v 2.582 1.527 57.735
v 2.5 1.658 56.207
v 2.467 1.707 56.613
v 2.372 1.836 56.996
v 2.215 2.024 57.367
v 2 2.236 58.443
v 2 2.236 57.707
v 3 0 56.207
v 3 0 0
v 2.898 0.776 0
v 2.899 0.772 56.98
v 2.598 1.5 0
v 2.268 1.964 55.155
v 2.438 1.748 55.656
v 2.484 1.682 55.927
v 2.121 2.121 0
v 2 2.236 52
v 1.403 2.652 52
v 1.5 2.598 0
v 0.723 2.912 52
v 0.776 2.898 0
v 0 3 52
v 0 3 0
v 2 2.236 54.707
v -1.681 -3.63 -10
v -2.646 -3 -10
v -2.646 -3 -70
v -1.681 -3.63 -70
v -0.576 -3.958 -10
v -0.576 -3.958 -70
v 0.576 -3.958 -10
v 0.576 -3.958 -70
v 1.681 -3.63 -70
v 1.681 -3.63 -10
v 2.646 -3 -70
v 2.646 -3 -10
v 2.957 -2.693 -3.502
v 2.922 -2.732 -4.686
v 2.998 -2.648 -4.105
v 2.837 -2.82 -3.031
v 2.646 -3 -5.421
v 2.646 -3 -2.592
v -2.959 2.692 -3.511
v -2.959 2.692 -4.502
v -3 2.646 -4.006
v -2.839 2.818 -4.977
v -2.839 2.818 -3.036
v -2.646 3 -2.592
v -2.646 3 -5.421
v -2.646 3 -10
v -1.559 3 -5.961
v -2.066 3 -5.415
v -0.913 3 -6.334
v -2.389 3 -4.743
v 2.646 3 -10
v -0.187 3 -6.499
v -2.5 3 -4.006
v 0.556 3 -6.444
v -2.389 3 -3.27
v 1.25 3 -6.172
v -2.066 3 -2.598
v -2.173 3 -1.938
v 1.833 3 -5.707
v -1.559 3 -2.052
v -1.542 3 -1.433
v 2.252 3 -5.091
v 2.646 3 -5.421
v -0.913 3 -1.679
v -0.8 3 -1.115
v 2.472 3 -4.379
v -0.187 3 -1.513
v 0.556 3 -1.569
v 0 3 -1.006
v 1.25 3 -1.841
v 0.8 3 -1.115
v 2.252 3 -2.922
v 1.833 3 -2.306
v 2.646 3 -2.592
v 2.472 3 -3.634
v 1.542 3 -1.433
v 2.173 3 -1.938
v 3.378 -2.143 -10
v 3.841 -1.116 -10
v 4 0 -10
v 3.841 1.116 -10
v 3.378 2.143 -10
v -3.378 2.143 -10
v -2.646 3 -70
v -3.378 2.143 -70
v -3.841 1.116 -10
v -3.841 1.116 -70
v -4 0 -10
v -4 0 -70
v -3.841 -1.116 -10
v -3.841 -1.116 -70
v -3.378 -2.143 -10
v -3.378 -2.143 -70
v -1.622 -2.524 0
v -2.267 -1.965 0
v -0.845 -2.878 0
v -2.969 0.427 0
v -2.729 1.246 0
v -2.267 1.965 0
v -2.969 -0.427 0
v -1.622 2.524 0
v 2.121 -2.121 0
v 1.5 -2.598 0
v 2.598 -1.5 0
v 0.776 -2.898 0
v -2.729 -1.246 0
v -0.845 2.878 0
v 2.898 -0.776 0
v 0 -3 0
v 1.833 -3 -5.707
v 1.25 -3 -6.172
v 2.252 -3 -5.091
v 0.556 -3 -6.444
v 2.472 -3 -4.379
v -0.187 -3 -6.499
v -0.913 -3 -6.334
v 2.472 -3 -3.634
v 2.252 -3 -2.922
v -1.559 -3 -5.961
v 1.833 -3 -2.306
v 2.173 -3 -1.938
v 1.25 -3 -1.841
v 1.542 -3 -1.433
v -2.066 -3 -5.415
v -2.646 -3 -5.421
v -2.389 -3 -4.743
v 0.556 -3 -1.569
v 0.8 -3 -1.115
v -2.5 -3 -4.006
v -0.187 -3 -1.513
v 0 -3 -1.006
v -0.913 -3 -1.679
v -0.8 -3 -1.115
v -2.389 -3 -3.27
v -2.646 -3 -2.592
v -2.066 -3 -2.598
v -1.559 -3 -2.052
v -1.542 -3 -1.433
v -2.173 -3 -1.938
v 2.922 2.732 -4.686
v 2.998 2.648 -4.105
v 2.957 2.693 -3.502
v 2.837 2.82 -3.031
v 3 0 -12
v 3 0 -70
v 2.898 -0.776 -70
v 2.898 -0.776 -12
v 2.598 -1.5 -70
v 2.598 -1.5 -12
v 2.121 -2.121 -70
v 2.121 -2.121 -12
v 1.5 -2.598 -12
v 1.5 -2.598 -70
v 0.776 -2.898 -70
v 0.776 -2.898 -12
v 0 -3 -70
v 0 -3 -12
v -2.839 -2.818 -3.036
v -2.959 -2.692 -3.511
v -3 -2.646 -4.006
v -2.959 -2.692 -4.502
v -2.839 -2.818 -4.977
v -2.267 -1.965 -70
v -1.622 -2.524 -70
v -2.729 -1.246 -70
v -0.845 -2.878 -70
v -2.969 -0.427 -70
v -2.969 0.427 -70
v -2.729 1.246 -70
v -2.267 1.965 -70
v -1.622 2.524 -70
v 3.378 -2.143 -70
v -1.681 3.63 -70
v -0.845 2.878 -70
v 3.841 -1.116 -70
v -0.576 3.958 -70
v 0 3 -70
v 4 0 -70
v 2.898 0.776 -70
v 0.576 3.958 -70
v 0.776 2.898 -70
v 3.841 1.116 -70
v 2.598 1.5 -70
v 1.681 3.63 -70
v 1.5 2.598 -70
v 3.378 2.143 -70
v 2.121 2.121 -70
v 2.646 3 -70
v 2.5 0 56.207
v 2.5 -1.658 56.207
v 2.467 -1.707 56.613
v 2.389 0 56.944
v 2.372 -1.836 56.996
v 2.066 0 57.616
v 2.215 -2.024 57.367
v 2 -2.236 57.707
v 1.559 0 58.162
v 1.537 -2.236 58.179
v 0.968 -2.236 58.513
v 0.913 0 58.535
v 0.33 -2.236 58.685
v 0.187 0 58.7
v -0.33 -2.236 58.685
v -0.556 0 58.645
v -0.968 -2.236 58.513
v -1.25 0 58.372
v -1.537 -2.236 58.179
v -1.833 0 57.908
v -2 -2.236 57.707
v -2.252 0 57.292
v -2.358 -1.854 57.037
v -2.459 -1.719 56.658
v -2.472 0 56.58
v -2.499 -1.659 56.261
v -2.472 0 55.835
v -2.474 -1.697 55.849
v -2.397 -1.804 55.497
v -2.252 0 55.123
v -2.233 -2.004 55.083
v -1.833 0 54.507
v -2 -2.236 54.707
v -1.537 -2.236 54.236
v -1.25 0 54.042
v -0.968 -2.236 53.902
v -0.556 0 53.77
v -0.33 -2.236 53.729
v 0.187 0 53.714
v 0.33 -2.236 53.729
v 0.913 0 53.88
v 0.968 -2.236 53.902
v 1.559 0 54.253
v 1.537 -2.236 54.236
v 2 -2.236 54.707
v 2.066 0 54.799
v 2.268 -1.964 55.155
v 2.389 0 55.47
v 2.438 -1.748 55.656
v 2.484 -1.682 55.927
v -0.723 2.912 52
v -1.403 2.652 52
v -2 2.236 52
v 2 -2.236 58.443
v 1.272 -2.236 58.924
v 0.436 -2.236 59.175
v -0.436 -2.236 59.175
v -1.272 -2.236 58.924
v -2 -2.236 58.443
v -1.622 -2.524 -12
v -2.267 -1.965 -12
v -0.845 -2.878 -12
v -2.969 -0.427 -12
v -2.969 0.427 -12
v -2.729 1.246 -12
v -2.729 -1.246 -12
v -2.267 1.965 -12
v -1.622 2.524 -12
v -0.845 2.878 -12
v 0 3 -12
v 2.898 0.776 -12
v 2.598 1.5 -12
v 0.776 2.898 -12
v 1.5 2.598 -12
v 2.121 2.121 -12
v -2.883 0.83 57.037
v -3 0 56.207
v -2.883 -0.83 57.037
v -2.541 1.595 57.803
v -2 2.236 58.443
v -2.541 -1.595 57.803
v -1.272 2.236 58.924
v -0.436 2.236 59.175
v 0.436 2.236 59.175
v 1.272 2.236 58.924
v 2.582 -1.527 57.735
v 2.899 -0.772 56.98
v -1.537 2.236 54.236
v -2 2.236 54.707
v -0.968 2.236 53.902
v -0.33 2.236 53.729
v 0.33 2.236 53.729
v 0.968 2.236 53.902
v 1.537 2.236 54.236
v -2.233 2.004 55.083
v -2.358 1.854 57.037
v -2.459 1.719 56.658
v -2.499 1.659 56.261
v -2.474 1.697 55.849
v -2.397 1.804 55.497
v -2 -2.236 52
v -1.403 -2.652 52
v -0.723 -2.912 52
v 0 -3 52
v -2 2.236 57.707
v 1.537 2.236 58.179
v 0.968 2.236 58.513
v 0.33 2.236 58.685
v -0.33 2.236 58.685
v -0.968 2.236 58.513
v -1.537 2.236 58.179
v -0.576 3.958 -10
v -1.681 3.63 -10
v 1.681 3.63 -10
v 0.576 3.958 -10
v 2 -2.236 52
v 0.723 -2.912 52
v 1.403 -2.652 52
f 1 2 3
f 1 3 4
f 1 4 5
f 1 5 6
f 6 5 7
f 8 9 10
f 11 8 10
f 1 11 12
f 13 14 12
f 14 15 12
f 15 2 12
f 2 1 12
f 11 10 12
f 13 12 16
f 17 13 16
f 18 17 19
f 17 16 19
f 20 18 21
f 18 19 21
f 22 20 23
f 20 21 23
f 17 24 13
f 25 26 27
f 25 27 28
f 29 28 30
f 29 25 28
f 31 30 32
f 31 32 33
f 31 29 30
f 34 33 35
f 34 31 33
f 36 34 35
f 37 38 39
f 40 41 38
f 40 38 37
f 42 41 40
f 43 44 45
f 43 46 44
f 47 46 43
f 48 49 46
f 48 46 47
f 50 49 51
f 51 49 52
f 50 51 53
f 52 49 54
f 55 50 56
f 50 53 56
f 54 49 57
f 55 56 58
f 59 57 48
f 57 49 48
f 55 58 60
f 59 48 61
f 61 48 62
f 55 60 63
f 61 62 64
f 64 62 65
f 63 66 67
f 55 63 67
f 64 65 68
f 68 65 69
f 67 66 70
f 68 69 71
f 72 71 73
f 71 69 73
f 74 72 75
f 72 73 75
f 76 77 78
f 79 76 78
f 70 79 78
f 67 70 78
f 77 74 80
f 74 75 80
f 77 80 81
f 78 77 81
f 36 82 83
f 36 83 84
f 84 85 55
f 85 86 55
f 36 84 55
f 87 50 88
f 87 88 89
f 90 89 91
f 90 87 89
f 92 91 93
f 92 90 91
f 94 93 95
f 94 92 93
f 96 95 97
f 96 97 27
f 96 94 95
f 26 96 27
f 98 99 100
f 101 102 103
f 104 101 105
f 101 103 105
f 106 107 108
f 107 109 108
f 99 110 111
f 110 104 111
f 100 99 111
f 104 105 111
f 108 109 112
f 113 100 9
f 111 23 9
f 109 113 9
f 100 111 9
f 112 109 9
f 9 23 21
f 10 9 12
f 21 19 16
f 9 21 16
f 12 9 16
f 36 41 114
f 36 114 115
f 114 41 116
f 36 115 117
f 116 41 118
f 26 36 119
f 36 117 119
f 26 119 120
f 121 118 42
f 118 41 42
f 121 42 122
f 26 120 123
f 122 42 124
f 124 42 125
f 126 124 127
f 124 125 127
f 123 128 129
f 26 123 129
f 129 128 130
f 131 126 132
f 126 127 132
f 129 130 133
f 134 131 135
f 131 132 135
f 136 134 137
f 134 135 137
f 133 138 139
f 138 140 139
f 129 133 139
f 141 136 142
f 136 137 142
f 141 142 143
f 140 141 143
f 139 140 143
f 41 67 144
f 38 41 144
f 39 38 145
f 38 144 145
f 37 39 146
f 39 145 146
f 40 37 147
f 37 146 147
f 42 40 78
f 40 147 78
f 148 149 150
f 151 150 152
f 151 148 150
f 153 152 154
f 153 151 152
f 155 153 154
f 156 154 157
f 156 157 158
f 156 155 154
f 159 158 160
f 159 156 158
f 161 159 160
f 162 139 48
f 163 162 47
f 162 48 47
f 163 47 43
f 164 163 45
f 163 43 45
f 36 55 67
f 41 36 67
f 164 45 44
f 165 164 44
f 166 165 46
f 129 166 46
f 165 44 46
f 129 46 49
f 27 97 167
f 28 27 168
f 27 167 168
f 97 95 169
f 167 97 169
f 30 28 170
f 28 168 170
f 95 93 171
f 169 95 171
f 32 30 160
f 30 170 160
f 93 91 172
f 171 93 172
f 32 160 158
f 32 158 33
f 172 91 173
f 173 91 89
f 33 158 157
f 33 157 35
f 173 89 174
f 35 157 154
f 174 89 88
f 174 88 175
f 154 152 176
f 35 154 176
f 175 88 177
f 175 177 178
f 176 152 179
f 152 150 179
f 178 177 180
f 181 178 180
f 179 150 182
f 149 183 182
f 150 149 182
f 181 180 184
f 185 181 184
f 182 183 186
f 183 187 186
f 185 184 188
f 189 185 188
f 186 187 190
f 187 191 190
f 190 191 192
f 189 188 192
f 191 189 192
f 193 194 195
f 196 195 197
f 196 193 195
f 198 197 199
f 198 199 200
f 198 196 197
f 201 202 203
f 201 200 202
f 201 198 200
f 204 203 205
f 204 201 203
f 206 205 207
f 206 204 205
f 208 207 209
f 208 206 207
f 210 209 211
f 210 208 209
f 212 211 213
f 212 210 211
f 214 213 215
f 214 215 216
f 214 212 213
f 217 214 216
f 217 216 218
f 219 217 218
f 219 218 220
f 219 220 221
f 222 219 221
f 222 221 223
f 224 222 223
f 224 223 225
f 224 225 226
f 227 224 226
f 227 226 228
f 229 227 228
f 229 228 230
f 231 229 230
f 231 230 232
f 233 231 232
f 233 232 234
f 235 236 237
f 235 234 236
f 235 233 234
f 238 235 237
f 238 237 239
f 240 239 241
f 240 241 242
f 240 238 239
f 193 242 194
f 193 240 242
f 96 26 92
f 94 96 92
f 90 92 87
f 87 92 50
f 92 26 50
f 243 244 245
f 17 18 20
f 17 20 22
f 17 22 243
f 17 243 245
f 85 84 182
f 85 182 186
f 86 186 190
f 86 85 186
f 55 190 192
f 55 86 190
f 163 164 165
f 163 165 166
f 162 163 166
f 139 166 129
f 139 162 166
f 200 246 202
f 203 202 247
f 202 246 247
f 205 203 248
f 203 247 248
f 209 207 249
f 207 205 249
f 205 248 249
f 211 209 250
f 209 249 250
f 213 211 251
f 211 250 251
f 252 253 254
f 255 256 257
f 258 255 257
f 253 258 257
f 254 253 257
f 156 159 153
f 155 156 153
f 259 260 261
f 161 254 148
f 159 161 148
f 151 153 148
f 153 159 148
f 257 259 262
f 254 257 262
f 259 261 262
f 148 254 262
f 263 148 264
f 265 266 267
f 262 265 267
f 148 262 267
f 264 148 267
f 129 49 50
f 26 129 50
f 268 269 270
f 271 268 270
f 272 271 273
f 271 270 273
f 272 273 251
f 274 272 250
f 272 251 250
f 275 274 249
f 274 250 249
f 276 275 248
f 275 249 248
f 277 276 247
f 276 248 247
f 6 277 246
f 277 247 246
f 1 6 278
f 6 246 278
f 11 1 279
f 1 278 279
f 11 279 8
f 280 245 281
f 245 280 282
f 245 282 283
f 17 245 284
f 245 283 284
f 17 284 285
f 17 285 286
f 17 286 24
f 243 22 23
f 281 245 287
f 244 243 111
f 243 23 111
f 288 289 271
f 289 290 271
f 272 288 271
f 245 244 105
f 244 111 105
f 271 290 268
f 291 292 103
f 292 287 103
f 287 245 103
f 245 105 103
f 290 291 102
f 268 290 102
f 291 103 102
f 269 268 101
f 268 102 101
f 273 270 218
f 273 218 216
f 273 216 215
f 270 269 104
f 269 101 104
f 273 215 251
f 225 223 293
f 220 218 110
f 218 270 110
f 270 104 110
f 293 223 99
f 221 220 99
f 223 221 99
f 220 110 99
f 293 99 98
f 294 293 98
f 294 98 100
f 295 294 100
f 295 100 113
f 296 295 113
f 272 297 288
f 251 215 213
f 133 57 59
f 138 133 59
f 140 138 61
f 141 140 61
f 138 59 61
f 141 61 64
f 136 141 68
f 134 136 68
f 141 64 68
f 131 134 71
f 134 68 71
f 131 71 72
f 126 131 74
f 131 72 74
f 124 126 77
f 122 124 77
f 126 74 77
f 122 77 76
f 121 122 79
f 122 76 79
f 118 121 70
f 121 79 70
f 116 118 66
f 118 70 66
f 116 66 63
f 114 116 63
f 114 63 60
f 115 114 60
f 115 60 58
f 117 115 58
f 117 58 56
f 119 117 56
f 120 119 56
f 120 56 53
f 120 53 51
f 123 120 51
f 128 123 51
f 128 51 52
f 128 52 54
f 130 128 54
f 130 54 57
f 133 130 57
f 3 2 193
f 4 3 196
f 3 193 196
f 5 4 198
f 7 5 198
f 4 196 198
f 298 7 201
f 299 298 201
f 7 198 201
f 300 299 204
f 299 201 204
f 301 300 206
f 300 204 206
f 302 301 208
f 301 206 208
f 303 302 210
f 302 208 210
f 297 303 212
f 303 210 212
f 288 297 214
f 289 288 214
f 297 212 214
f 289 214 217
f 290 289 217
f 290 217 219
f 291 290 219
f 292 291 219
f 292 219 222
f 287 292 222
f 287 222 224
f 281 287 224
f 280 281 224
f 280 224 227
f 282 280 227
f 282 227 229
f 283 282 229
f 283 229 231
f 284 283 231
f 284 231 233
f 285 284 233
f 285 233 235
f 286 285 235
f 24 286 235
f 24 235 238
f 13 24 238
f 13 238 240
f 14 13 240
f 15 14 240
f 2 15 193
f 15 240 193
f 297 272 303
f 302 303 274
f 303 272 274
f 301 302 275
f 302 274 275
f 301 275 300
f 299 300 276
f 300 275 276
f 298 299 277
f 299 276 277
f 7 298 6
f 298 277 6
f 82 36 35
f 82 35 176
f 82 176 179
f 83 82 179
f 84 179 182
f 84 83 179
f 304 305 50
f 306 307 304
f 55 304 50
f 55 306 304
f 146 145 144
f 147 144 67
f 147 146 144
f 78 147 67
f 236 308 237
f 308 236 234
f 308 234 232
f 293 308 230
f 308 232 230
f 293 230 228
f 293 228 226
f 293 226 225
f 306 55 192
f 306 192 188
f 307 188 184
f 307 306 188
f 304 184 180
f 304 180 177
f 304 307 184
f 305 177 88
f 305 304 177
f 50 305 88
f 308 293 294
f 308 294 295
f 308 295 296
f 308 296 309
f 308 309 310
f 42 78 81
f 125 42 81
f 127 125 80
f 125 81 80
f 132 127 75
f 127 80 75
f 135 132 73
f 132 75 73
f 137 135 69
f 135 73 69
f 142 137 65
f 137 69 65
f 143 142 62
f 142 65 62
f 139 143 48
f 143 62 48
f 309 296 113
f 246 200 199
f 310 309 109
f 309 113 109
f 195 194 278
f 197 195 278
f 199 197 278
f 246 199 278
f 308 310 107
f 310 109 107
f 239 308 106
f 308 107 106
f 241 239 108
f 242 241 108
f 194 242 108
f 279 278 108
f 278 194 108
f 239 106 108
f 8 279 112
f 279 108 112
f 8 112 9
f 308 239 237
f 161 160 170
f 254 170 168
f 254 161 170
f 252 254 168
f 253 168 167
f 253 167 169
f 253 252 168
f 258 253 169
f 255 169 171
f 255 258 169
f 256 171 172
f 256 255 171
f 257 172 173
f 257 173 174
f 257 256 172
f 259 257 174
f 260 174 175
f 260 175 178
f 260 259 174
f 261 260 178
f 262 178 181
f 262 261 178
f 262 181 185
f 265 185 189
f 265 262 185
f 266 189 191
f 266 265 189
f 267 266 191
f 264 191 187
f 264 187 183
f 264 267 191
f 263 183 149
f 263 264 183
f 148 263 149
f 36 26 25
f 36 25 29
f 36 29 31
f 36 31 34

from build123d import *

# Parameters (mm, degrees)
F1_DEPTH  = 70
F2_DEPTH  = 60
F3_DEPTH  = 12
F4_DEPTH  = 10
F5_R      = 2.5
F6_DEPTH  = 25
F8_DEPTH  = 8
F9_R      = 2.5
F10_DEPTH = 12.5


with BuildPart() as f1:
    # F0 (on Top) → F1 (new body)
    with BuildSketch(Plane.XY):
        with BuildLine():
            ThreePointArc((2.6457513111, -3), (3.6457513111, -1.6457513111), (4, 0))
            ThreePointArc((4, 0), (3.6457513111, 1.6457513111), (2.6457513111, 3))
            Line((2.6457513111, 3), (0, 3))
            ThreePointArc((0, 3), (2.1213203436, 2.1213203436), (3, 0))
            ThreePointArc((3, 0), (2.1213203436, -2.1213203436), (0, -3))
            Line((0, -3), (2.6457513111, -3))
        make_face()
        with BuildLine():
            Line((0, 3), (2.6457513111, 3))
            ThreePointArc((2.6457513111, 3), (0, 4), (-2.6457513111, 3))
            Line((-2.6457513111, 3), (0, 3))
        make_face()
        with BuildLine():
            ThreePointArc((-2.6457513111, -3), (0, -4), (2.6457513111, -3))
            Line((2.6457513111, -3), (0, -3))
            Line((0, -3), (-2.6457513111, -3))
        make_face()
        with BuildLine():
            Line((0, 3), (-2.6457513111, 3))
            ThreePointArc((-2.6457513111, 3), (-4, 0), (-2.6457513111, -3))
            Line((-2.6457513111, -3), (0, -3))
            ThreePointArc((0, -3), (-3, 0), (0, 3))
        make_face()
    extrude(amount=-F1_DEPTH)



with BuildPart() as f2:
    # F0 (on Top) → F2 (new body)
    with BuildSketch(Plane.XY):
        with BuildLine():
            ThreePointArc((3, 0), (2.1213203436, 2.1213203436), (0, 3))
            ThreePointArc((0, 3), (-3, 0), (0, -3))
            ThreePointArc((0, -3), (2.1213203436, -2.1213203436), (3, 0))
        make_face()
    extrude(amount=F2_DEPTH)


with BuildPart() as f1_1:
    add(f1.part)

    add(f2.part)  # F3 merges F2
    # F0 (on Top) → F3 (join)
    with BuildSketch(Plane.XY):
        with BuildLine():
            ThreePointArc((3, 0), (2.1213203436, 2.1213203436), (0, 3))
            ThreePointArc((0, 3), (-3, 0), (0, -3))
            ThreePointArc((0, -3), (2.1213203436, -2.1213203436), (3, 0))
        make_face()
    extrude(amount=-F3_DEPTH)

    # F0 (on Top) → F4 (cut)
    with BuildSketch(Plane.XY):
        with BuildLine():
            Line((0, 3), (2.6457513111, 3))
            ThreePointArc((2.6457513111, 3), (0, 4), (-2.6457513111, 3))
            Line((-2.6457513111, 3), (0, 3))
        make_face()
        with BuildLine():
            ThreePointArc((-2.6457513111, -3), (0, -4), (2.6457513111, -3))
            Line((2.6457513111, -3), (0, -3))
            Line((0, -3), (-2.6457513111, -3))
        make_face()
    extrude(amount=-F4_DEPTH, mode=Mode.SUBTRACT)

    # F5 (on face) → F6 (cut)
    with BuildSketch(Plane(origin=(0, 3, 0), x_dir=(-1, 0, 0), z_dir=(0, 1, 0))):
        with Locations((0, -4.0064705536)):
            Circle(F5_R)
        with BuildLine():
            ThreePointArc((-2.6457513111, -5.420684116), (-3, -4.0064705536), (-2.6457513111, -2.5922569912))
            Line((-2.6457513111, -2.5922569912), (-2.6457513111, 0))
            Line((-2.6457513111, 0), (-4, 0))
            Line((-4, 0), (-4, -10))
            Line((-4, -10), (-2.6457513111, -10))
            Line((-2.6457513111, -10), (-2.6457513111, -5.420684116))
        make_face()
        with BuildLine():
            ThreePointArc((2.6457513111, -2.5922569912), (2.9100905427, -3.2775171714), (3, -4.0064705536))
            ThreePointArc((3, -4.0064705536), (2.9100905427, -4.7354239358), (2.6457513111, -5.420684116))
            Line((2.6457513111, -5.420684116), (2.6457513111, -10))
            Line((2.6457513111, -10), (4, -10))
            Line((4, -10), (4, 0))
            Line((4, 0), (2.6457513111, 0))
            Line((2.6457513111, 0), (2.6457513111, -2.5922569912))
        make_face()
        with BuildLine():
            ThreePointArc((-2.6457513111, -2.5922569912), (0, -1.0064705536), (2.6457513111, -2.5922569912))
            Line((2.6457513111, -2.5922569912), (2.6457513111, 0))
            Line((2.6457513111, 0), (1.3542486889, 0))
            Line((1.3542486889, 0), (0, 0))
            Line((0, 0), (-1.3542486889, 0))
            Line((-1.3542486889, 0), (-2.6457513111, 0))
            Line((-2.6457513111, 0), (-2.6457513111, -2.5922569912))
        make_face()
    extrude(amount=-F6_DEPTH, mode=Mode.SUBTRACT)

    # F7 (on face) → F8 (cut)
    with BuildSketch(Plane.XY.offset(60)):
        with BuildLine():
            ThreePointArc((2, 2.2360679775), (0, 3), (-2, 2.2360679775))
            Line((-2, 2.2360679775), (2, 2.2360679775))
        make_face()
        with BuildLine():
            ThreePointArc((-2, -2.2360679775), (0, -3), (2, -2.2360679775))
            Line((2, -2.2360679775), (-2, -2.2360679775))
        make_face()
    extrude(amount=-F8_DEPTH, mode=Mode.SUBTRACT)

    # F9 (on Front) → F10 (cut, symmetric)
    with BuildSketch(Plane.XZ):
        with Locations((0, 56.2073551118)):
            Circle(F9_R)
        with BuildLine():
            Line((-3, 60), (-3, 56.2073551118))
            ThreePointArc((-3, 56.2073551118), (0, 59.2073551118), (3, 56.2073551118))
            Line((3, 56.2073551118), (3, 60))
            Line((3, 60), (-3, 60))
        make_face()
    extrude(amount=F10_DEPTH, both=True, mode=Mode.SUBTRACT)


solid = f1_1.part
